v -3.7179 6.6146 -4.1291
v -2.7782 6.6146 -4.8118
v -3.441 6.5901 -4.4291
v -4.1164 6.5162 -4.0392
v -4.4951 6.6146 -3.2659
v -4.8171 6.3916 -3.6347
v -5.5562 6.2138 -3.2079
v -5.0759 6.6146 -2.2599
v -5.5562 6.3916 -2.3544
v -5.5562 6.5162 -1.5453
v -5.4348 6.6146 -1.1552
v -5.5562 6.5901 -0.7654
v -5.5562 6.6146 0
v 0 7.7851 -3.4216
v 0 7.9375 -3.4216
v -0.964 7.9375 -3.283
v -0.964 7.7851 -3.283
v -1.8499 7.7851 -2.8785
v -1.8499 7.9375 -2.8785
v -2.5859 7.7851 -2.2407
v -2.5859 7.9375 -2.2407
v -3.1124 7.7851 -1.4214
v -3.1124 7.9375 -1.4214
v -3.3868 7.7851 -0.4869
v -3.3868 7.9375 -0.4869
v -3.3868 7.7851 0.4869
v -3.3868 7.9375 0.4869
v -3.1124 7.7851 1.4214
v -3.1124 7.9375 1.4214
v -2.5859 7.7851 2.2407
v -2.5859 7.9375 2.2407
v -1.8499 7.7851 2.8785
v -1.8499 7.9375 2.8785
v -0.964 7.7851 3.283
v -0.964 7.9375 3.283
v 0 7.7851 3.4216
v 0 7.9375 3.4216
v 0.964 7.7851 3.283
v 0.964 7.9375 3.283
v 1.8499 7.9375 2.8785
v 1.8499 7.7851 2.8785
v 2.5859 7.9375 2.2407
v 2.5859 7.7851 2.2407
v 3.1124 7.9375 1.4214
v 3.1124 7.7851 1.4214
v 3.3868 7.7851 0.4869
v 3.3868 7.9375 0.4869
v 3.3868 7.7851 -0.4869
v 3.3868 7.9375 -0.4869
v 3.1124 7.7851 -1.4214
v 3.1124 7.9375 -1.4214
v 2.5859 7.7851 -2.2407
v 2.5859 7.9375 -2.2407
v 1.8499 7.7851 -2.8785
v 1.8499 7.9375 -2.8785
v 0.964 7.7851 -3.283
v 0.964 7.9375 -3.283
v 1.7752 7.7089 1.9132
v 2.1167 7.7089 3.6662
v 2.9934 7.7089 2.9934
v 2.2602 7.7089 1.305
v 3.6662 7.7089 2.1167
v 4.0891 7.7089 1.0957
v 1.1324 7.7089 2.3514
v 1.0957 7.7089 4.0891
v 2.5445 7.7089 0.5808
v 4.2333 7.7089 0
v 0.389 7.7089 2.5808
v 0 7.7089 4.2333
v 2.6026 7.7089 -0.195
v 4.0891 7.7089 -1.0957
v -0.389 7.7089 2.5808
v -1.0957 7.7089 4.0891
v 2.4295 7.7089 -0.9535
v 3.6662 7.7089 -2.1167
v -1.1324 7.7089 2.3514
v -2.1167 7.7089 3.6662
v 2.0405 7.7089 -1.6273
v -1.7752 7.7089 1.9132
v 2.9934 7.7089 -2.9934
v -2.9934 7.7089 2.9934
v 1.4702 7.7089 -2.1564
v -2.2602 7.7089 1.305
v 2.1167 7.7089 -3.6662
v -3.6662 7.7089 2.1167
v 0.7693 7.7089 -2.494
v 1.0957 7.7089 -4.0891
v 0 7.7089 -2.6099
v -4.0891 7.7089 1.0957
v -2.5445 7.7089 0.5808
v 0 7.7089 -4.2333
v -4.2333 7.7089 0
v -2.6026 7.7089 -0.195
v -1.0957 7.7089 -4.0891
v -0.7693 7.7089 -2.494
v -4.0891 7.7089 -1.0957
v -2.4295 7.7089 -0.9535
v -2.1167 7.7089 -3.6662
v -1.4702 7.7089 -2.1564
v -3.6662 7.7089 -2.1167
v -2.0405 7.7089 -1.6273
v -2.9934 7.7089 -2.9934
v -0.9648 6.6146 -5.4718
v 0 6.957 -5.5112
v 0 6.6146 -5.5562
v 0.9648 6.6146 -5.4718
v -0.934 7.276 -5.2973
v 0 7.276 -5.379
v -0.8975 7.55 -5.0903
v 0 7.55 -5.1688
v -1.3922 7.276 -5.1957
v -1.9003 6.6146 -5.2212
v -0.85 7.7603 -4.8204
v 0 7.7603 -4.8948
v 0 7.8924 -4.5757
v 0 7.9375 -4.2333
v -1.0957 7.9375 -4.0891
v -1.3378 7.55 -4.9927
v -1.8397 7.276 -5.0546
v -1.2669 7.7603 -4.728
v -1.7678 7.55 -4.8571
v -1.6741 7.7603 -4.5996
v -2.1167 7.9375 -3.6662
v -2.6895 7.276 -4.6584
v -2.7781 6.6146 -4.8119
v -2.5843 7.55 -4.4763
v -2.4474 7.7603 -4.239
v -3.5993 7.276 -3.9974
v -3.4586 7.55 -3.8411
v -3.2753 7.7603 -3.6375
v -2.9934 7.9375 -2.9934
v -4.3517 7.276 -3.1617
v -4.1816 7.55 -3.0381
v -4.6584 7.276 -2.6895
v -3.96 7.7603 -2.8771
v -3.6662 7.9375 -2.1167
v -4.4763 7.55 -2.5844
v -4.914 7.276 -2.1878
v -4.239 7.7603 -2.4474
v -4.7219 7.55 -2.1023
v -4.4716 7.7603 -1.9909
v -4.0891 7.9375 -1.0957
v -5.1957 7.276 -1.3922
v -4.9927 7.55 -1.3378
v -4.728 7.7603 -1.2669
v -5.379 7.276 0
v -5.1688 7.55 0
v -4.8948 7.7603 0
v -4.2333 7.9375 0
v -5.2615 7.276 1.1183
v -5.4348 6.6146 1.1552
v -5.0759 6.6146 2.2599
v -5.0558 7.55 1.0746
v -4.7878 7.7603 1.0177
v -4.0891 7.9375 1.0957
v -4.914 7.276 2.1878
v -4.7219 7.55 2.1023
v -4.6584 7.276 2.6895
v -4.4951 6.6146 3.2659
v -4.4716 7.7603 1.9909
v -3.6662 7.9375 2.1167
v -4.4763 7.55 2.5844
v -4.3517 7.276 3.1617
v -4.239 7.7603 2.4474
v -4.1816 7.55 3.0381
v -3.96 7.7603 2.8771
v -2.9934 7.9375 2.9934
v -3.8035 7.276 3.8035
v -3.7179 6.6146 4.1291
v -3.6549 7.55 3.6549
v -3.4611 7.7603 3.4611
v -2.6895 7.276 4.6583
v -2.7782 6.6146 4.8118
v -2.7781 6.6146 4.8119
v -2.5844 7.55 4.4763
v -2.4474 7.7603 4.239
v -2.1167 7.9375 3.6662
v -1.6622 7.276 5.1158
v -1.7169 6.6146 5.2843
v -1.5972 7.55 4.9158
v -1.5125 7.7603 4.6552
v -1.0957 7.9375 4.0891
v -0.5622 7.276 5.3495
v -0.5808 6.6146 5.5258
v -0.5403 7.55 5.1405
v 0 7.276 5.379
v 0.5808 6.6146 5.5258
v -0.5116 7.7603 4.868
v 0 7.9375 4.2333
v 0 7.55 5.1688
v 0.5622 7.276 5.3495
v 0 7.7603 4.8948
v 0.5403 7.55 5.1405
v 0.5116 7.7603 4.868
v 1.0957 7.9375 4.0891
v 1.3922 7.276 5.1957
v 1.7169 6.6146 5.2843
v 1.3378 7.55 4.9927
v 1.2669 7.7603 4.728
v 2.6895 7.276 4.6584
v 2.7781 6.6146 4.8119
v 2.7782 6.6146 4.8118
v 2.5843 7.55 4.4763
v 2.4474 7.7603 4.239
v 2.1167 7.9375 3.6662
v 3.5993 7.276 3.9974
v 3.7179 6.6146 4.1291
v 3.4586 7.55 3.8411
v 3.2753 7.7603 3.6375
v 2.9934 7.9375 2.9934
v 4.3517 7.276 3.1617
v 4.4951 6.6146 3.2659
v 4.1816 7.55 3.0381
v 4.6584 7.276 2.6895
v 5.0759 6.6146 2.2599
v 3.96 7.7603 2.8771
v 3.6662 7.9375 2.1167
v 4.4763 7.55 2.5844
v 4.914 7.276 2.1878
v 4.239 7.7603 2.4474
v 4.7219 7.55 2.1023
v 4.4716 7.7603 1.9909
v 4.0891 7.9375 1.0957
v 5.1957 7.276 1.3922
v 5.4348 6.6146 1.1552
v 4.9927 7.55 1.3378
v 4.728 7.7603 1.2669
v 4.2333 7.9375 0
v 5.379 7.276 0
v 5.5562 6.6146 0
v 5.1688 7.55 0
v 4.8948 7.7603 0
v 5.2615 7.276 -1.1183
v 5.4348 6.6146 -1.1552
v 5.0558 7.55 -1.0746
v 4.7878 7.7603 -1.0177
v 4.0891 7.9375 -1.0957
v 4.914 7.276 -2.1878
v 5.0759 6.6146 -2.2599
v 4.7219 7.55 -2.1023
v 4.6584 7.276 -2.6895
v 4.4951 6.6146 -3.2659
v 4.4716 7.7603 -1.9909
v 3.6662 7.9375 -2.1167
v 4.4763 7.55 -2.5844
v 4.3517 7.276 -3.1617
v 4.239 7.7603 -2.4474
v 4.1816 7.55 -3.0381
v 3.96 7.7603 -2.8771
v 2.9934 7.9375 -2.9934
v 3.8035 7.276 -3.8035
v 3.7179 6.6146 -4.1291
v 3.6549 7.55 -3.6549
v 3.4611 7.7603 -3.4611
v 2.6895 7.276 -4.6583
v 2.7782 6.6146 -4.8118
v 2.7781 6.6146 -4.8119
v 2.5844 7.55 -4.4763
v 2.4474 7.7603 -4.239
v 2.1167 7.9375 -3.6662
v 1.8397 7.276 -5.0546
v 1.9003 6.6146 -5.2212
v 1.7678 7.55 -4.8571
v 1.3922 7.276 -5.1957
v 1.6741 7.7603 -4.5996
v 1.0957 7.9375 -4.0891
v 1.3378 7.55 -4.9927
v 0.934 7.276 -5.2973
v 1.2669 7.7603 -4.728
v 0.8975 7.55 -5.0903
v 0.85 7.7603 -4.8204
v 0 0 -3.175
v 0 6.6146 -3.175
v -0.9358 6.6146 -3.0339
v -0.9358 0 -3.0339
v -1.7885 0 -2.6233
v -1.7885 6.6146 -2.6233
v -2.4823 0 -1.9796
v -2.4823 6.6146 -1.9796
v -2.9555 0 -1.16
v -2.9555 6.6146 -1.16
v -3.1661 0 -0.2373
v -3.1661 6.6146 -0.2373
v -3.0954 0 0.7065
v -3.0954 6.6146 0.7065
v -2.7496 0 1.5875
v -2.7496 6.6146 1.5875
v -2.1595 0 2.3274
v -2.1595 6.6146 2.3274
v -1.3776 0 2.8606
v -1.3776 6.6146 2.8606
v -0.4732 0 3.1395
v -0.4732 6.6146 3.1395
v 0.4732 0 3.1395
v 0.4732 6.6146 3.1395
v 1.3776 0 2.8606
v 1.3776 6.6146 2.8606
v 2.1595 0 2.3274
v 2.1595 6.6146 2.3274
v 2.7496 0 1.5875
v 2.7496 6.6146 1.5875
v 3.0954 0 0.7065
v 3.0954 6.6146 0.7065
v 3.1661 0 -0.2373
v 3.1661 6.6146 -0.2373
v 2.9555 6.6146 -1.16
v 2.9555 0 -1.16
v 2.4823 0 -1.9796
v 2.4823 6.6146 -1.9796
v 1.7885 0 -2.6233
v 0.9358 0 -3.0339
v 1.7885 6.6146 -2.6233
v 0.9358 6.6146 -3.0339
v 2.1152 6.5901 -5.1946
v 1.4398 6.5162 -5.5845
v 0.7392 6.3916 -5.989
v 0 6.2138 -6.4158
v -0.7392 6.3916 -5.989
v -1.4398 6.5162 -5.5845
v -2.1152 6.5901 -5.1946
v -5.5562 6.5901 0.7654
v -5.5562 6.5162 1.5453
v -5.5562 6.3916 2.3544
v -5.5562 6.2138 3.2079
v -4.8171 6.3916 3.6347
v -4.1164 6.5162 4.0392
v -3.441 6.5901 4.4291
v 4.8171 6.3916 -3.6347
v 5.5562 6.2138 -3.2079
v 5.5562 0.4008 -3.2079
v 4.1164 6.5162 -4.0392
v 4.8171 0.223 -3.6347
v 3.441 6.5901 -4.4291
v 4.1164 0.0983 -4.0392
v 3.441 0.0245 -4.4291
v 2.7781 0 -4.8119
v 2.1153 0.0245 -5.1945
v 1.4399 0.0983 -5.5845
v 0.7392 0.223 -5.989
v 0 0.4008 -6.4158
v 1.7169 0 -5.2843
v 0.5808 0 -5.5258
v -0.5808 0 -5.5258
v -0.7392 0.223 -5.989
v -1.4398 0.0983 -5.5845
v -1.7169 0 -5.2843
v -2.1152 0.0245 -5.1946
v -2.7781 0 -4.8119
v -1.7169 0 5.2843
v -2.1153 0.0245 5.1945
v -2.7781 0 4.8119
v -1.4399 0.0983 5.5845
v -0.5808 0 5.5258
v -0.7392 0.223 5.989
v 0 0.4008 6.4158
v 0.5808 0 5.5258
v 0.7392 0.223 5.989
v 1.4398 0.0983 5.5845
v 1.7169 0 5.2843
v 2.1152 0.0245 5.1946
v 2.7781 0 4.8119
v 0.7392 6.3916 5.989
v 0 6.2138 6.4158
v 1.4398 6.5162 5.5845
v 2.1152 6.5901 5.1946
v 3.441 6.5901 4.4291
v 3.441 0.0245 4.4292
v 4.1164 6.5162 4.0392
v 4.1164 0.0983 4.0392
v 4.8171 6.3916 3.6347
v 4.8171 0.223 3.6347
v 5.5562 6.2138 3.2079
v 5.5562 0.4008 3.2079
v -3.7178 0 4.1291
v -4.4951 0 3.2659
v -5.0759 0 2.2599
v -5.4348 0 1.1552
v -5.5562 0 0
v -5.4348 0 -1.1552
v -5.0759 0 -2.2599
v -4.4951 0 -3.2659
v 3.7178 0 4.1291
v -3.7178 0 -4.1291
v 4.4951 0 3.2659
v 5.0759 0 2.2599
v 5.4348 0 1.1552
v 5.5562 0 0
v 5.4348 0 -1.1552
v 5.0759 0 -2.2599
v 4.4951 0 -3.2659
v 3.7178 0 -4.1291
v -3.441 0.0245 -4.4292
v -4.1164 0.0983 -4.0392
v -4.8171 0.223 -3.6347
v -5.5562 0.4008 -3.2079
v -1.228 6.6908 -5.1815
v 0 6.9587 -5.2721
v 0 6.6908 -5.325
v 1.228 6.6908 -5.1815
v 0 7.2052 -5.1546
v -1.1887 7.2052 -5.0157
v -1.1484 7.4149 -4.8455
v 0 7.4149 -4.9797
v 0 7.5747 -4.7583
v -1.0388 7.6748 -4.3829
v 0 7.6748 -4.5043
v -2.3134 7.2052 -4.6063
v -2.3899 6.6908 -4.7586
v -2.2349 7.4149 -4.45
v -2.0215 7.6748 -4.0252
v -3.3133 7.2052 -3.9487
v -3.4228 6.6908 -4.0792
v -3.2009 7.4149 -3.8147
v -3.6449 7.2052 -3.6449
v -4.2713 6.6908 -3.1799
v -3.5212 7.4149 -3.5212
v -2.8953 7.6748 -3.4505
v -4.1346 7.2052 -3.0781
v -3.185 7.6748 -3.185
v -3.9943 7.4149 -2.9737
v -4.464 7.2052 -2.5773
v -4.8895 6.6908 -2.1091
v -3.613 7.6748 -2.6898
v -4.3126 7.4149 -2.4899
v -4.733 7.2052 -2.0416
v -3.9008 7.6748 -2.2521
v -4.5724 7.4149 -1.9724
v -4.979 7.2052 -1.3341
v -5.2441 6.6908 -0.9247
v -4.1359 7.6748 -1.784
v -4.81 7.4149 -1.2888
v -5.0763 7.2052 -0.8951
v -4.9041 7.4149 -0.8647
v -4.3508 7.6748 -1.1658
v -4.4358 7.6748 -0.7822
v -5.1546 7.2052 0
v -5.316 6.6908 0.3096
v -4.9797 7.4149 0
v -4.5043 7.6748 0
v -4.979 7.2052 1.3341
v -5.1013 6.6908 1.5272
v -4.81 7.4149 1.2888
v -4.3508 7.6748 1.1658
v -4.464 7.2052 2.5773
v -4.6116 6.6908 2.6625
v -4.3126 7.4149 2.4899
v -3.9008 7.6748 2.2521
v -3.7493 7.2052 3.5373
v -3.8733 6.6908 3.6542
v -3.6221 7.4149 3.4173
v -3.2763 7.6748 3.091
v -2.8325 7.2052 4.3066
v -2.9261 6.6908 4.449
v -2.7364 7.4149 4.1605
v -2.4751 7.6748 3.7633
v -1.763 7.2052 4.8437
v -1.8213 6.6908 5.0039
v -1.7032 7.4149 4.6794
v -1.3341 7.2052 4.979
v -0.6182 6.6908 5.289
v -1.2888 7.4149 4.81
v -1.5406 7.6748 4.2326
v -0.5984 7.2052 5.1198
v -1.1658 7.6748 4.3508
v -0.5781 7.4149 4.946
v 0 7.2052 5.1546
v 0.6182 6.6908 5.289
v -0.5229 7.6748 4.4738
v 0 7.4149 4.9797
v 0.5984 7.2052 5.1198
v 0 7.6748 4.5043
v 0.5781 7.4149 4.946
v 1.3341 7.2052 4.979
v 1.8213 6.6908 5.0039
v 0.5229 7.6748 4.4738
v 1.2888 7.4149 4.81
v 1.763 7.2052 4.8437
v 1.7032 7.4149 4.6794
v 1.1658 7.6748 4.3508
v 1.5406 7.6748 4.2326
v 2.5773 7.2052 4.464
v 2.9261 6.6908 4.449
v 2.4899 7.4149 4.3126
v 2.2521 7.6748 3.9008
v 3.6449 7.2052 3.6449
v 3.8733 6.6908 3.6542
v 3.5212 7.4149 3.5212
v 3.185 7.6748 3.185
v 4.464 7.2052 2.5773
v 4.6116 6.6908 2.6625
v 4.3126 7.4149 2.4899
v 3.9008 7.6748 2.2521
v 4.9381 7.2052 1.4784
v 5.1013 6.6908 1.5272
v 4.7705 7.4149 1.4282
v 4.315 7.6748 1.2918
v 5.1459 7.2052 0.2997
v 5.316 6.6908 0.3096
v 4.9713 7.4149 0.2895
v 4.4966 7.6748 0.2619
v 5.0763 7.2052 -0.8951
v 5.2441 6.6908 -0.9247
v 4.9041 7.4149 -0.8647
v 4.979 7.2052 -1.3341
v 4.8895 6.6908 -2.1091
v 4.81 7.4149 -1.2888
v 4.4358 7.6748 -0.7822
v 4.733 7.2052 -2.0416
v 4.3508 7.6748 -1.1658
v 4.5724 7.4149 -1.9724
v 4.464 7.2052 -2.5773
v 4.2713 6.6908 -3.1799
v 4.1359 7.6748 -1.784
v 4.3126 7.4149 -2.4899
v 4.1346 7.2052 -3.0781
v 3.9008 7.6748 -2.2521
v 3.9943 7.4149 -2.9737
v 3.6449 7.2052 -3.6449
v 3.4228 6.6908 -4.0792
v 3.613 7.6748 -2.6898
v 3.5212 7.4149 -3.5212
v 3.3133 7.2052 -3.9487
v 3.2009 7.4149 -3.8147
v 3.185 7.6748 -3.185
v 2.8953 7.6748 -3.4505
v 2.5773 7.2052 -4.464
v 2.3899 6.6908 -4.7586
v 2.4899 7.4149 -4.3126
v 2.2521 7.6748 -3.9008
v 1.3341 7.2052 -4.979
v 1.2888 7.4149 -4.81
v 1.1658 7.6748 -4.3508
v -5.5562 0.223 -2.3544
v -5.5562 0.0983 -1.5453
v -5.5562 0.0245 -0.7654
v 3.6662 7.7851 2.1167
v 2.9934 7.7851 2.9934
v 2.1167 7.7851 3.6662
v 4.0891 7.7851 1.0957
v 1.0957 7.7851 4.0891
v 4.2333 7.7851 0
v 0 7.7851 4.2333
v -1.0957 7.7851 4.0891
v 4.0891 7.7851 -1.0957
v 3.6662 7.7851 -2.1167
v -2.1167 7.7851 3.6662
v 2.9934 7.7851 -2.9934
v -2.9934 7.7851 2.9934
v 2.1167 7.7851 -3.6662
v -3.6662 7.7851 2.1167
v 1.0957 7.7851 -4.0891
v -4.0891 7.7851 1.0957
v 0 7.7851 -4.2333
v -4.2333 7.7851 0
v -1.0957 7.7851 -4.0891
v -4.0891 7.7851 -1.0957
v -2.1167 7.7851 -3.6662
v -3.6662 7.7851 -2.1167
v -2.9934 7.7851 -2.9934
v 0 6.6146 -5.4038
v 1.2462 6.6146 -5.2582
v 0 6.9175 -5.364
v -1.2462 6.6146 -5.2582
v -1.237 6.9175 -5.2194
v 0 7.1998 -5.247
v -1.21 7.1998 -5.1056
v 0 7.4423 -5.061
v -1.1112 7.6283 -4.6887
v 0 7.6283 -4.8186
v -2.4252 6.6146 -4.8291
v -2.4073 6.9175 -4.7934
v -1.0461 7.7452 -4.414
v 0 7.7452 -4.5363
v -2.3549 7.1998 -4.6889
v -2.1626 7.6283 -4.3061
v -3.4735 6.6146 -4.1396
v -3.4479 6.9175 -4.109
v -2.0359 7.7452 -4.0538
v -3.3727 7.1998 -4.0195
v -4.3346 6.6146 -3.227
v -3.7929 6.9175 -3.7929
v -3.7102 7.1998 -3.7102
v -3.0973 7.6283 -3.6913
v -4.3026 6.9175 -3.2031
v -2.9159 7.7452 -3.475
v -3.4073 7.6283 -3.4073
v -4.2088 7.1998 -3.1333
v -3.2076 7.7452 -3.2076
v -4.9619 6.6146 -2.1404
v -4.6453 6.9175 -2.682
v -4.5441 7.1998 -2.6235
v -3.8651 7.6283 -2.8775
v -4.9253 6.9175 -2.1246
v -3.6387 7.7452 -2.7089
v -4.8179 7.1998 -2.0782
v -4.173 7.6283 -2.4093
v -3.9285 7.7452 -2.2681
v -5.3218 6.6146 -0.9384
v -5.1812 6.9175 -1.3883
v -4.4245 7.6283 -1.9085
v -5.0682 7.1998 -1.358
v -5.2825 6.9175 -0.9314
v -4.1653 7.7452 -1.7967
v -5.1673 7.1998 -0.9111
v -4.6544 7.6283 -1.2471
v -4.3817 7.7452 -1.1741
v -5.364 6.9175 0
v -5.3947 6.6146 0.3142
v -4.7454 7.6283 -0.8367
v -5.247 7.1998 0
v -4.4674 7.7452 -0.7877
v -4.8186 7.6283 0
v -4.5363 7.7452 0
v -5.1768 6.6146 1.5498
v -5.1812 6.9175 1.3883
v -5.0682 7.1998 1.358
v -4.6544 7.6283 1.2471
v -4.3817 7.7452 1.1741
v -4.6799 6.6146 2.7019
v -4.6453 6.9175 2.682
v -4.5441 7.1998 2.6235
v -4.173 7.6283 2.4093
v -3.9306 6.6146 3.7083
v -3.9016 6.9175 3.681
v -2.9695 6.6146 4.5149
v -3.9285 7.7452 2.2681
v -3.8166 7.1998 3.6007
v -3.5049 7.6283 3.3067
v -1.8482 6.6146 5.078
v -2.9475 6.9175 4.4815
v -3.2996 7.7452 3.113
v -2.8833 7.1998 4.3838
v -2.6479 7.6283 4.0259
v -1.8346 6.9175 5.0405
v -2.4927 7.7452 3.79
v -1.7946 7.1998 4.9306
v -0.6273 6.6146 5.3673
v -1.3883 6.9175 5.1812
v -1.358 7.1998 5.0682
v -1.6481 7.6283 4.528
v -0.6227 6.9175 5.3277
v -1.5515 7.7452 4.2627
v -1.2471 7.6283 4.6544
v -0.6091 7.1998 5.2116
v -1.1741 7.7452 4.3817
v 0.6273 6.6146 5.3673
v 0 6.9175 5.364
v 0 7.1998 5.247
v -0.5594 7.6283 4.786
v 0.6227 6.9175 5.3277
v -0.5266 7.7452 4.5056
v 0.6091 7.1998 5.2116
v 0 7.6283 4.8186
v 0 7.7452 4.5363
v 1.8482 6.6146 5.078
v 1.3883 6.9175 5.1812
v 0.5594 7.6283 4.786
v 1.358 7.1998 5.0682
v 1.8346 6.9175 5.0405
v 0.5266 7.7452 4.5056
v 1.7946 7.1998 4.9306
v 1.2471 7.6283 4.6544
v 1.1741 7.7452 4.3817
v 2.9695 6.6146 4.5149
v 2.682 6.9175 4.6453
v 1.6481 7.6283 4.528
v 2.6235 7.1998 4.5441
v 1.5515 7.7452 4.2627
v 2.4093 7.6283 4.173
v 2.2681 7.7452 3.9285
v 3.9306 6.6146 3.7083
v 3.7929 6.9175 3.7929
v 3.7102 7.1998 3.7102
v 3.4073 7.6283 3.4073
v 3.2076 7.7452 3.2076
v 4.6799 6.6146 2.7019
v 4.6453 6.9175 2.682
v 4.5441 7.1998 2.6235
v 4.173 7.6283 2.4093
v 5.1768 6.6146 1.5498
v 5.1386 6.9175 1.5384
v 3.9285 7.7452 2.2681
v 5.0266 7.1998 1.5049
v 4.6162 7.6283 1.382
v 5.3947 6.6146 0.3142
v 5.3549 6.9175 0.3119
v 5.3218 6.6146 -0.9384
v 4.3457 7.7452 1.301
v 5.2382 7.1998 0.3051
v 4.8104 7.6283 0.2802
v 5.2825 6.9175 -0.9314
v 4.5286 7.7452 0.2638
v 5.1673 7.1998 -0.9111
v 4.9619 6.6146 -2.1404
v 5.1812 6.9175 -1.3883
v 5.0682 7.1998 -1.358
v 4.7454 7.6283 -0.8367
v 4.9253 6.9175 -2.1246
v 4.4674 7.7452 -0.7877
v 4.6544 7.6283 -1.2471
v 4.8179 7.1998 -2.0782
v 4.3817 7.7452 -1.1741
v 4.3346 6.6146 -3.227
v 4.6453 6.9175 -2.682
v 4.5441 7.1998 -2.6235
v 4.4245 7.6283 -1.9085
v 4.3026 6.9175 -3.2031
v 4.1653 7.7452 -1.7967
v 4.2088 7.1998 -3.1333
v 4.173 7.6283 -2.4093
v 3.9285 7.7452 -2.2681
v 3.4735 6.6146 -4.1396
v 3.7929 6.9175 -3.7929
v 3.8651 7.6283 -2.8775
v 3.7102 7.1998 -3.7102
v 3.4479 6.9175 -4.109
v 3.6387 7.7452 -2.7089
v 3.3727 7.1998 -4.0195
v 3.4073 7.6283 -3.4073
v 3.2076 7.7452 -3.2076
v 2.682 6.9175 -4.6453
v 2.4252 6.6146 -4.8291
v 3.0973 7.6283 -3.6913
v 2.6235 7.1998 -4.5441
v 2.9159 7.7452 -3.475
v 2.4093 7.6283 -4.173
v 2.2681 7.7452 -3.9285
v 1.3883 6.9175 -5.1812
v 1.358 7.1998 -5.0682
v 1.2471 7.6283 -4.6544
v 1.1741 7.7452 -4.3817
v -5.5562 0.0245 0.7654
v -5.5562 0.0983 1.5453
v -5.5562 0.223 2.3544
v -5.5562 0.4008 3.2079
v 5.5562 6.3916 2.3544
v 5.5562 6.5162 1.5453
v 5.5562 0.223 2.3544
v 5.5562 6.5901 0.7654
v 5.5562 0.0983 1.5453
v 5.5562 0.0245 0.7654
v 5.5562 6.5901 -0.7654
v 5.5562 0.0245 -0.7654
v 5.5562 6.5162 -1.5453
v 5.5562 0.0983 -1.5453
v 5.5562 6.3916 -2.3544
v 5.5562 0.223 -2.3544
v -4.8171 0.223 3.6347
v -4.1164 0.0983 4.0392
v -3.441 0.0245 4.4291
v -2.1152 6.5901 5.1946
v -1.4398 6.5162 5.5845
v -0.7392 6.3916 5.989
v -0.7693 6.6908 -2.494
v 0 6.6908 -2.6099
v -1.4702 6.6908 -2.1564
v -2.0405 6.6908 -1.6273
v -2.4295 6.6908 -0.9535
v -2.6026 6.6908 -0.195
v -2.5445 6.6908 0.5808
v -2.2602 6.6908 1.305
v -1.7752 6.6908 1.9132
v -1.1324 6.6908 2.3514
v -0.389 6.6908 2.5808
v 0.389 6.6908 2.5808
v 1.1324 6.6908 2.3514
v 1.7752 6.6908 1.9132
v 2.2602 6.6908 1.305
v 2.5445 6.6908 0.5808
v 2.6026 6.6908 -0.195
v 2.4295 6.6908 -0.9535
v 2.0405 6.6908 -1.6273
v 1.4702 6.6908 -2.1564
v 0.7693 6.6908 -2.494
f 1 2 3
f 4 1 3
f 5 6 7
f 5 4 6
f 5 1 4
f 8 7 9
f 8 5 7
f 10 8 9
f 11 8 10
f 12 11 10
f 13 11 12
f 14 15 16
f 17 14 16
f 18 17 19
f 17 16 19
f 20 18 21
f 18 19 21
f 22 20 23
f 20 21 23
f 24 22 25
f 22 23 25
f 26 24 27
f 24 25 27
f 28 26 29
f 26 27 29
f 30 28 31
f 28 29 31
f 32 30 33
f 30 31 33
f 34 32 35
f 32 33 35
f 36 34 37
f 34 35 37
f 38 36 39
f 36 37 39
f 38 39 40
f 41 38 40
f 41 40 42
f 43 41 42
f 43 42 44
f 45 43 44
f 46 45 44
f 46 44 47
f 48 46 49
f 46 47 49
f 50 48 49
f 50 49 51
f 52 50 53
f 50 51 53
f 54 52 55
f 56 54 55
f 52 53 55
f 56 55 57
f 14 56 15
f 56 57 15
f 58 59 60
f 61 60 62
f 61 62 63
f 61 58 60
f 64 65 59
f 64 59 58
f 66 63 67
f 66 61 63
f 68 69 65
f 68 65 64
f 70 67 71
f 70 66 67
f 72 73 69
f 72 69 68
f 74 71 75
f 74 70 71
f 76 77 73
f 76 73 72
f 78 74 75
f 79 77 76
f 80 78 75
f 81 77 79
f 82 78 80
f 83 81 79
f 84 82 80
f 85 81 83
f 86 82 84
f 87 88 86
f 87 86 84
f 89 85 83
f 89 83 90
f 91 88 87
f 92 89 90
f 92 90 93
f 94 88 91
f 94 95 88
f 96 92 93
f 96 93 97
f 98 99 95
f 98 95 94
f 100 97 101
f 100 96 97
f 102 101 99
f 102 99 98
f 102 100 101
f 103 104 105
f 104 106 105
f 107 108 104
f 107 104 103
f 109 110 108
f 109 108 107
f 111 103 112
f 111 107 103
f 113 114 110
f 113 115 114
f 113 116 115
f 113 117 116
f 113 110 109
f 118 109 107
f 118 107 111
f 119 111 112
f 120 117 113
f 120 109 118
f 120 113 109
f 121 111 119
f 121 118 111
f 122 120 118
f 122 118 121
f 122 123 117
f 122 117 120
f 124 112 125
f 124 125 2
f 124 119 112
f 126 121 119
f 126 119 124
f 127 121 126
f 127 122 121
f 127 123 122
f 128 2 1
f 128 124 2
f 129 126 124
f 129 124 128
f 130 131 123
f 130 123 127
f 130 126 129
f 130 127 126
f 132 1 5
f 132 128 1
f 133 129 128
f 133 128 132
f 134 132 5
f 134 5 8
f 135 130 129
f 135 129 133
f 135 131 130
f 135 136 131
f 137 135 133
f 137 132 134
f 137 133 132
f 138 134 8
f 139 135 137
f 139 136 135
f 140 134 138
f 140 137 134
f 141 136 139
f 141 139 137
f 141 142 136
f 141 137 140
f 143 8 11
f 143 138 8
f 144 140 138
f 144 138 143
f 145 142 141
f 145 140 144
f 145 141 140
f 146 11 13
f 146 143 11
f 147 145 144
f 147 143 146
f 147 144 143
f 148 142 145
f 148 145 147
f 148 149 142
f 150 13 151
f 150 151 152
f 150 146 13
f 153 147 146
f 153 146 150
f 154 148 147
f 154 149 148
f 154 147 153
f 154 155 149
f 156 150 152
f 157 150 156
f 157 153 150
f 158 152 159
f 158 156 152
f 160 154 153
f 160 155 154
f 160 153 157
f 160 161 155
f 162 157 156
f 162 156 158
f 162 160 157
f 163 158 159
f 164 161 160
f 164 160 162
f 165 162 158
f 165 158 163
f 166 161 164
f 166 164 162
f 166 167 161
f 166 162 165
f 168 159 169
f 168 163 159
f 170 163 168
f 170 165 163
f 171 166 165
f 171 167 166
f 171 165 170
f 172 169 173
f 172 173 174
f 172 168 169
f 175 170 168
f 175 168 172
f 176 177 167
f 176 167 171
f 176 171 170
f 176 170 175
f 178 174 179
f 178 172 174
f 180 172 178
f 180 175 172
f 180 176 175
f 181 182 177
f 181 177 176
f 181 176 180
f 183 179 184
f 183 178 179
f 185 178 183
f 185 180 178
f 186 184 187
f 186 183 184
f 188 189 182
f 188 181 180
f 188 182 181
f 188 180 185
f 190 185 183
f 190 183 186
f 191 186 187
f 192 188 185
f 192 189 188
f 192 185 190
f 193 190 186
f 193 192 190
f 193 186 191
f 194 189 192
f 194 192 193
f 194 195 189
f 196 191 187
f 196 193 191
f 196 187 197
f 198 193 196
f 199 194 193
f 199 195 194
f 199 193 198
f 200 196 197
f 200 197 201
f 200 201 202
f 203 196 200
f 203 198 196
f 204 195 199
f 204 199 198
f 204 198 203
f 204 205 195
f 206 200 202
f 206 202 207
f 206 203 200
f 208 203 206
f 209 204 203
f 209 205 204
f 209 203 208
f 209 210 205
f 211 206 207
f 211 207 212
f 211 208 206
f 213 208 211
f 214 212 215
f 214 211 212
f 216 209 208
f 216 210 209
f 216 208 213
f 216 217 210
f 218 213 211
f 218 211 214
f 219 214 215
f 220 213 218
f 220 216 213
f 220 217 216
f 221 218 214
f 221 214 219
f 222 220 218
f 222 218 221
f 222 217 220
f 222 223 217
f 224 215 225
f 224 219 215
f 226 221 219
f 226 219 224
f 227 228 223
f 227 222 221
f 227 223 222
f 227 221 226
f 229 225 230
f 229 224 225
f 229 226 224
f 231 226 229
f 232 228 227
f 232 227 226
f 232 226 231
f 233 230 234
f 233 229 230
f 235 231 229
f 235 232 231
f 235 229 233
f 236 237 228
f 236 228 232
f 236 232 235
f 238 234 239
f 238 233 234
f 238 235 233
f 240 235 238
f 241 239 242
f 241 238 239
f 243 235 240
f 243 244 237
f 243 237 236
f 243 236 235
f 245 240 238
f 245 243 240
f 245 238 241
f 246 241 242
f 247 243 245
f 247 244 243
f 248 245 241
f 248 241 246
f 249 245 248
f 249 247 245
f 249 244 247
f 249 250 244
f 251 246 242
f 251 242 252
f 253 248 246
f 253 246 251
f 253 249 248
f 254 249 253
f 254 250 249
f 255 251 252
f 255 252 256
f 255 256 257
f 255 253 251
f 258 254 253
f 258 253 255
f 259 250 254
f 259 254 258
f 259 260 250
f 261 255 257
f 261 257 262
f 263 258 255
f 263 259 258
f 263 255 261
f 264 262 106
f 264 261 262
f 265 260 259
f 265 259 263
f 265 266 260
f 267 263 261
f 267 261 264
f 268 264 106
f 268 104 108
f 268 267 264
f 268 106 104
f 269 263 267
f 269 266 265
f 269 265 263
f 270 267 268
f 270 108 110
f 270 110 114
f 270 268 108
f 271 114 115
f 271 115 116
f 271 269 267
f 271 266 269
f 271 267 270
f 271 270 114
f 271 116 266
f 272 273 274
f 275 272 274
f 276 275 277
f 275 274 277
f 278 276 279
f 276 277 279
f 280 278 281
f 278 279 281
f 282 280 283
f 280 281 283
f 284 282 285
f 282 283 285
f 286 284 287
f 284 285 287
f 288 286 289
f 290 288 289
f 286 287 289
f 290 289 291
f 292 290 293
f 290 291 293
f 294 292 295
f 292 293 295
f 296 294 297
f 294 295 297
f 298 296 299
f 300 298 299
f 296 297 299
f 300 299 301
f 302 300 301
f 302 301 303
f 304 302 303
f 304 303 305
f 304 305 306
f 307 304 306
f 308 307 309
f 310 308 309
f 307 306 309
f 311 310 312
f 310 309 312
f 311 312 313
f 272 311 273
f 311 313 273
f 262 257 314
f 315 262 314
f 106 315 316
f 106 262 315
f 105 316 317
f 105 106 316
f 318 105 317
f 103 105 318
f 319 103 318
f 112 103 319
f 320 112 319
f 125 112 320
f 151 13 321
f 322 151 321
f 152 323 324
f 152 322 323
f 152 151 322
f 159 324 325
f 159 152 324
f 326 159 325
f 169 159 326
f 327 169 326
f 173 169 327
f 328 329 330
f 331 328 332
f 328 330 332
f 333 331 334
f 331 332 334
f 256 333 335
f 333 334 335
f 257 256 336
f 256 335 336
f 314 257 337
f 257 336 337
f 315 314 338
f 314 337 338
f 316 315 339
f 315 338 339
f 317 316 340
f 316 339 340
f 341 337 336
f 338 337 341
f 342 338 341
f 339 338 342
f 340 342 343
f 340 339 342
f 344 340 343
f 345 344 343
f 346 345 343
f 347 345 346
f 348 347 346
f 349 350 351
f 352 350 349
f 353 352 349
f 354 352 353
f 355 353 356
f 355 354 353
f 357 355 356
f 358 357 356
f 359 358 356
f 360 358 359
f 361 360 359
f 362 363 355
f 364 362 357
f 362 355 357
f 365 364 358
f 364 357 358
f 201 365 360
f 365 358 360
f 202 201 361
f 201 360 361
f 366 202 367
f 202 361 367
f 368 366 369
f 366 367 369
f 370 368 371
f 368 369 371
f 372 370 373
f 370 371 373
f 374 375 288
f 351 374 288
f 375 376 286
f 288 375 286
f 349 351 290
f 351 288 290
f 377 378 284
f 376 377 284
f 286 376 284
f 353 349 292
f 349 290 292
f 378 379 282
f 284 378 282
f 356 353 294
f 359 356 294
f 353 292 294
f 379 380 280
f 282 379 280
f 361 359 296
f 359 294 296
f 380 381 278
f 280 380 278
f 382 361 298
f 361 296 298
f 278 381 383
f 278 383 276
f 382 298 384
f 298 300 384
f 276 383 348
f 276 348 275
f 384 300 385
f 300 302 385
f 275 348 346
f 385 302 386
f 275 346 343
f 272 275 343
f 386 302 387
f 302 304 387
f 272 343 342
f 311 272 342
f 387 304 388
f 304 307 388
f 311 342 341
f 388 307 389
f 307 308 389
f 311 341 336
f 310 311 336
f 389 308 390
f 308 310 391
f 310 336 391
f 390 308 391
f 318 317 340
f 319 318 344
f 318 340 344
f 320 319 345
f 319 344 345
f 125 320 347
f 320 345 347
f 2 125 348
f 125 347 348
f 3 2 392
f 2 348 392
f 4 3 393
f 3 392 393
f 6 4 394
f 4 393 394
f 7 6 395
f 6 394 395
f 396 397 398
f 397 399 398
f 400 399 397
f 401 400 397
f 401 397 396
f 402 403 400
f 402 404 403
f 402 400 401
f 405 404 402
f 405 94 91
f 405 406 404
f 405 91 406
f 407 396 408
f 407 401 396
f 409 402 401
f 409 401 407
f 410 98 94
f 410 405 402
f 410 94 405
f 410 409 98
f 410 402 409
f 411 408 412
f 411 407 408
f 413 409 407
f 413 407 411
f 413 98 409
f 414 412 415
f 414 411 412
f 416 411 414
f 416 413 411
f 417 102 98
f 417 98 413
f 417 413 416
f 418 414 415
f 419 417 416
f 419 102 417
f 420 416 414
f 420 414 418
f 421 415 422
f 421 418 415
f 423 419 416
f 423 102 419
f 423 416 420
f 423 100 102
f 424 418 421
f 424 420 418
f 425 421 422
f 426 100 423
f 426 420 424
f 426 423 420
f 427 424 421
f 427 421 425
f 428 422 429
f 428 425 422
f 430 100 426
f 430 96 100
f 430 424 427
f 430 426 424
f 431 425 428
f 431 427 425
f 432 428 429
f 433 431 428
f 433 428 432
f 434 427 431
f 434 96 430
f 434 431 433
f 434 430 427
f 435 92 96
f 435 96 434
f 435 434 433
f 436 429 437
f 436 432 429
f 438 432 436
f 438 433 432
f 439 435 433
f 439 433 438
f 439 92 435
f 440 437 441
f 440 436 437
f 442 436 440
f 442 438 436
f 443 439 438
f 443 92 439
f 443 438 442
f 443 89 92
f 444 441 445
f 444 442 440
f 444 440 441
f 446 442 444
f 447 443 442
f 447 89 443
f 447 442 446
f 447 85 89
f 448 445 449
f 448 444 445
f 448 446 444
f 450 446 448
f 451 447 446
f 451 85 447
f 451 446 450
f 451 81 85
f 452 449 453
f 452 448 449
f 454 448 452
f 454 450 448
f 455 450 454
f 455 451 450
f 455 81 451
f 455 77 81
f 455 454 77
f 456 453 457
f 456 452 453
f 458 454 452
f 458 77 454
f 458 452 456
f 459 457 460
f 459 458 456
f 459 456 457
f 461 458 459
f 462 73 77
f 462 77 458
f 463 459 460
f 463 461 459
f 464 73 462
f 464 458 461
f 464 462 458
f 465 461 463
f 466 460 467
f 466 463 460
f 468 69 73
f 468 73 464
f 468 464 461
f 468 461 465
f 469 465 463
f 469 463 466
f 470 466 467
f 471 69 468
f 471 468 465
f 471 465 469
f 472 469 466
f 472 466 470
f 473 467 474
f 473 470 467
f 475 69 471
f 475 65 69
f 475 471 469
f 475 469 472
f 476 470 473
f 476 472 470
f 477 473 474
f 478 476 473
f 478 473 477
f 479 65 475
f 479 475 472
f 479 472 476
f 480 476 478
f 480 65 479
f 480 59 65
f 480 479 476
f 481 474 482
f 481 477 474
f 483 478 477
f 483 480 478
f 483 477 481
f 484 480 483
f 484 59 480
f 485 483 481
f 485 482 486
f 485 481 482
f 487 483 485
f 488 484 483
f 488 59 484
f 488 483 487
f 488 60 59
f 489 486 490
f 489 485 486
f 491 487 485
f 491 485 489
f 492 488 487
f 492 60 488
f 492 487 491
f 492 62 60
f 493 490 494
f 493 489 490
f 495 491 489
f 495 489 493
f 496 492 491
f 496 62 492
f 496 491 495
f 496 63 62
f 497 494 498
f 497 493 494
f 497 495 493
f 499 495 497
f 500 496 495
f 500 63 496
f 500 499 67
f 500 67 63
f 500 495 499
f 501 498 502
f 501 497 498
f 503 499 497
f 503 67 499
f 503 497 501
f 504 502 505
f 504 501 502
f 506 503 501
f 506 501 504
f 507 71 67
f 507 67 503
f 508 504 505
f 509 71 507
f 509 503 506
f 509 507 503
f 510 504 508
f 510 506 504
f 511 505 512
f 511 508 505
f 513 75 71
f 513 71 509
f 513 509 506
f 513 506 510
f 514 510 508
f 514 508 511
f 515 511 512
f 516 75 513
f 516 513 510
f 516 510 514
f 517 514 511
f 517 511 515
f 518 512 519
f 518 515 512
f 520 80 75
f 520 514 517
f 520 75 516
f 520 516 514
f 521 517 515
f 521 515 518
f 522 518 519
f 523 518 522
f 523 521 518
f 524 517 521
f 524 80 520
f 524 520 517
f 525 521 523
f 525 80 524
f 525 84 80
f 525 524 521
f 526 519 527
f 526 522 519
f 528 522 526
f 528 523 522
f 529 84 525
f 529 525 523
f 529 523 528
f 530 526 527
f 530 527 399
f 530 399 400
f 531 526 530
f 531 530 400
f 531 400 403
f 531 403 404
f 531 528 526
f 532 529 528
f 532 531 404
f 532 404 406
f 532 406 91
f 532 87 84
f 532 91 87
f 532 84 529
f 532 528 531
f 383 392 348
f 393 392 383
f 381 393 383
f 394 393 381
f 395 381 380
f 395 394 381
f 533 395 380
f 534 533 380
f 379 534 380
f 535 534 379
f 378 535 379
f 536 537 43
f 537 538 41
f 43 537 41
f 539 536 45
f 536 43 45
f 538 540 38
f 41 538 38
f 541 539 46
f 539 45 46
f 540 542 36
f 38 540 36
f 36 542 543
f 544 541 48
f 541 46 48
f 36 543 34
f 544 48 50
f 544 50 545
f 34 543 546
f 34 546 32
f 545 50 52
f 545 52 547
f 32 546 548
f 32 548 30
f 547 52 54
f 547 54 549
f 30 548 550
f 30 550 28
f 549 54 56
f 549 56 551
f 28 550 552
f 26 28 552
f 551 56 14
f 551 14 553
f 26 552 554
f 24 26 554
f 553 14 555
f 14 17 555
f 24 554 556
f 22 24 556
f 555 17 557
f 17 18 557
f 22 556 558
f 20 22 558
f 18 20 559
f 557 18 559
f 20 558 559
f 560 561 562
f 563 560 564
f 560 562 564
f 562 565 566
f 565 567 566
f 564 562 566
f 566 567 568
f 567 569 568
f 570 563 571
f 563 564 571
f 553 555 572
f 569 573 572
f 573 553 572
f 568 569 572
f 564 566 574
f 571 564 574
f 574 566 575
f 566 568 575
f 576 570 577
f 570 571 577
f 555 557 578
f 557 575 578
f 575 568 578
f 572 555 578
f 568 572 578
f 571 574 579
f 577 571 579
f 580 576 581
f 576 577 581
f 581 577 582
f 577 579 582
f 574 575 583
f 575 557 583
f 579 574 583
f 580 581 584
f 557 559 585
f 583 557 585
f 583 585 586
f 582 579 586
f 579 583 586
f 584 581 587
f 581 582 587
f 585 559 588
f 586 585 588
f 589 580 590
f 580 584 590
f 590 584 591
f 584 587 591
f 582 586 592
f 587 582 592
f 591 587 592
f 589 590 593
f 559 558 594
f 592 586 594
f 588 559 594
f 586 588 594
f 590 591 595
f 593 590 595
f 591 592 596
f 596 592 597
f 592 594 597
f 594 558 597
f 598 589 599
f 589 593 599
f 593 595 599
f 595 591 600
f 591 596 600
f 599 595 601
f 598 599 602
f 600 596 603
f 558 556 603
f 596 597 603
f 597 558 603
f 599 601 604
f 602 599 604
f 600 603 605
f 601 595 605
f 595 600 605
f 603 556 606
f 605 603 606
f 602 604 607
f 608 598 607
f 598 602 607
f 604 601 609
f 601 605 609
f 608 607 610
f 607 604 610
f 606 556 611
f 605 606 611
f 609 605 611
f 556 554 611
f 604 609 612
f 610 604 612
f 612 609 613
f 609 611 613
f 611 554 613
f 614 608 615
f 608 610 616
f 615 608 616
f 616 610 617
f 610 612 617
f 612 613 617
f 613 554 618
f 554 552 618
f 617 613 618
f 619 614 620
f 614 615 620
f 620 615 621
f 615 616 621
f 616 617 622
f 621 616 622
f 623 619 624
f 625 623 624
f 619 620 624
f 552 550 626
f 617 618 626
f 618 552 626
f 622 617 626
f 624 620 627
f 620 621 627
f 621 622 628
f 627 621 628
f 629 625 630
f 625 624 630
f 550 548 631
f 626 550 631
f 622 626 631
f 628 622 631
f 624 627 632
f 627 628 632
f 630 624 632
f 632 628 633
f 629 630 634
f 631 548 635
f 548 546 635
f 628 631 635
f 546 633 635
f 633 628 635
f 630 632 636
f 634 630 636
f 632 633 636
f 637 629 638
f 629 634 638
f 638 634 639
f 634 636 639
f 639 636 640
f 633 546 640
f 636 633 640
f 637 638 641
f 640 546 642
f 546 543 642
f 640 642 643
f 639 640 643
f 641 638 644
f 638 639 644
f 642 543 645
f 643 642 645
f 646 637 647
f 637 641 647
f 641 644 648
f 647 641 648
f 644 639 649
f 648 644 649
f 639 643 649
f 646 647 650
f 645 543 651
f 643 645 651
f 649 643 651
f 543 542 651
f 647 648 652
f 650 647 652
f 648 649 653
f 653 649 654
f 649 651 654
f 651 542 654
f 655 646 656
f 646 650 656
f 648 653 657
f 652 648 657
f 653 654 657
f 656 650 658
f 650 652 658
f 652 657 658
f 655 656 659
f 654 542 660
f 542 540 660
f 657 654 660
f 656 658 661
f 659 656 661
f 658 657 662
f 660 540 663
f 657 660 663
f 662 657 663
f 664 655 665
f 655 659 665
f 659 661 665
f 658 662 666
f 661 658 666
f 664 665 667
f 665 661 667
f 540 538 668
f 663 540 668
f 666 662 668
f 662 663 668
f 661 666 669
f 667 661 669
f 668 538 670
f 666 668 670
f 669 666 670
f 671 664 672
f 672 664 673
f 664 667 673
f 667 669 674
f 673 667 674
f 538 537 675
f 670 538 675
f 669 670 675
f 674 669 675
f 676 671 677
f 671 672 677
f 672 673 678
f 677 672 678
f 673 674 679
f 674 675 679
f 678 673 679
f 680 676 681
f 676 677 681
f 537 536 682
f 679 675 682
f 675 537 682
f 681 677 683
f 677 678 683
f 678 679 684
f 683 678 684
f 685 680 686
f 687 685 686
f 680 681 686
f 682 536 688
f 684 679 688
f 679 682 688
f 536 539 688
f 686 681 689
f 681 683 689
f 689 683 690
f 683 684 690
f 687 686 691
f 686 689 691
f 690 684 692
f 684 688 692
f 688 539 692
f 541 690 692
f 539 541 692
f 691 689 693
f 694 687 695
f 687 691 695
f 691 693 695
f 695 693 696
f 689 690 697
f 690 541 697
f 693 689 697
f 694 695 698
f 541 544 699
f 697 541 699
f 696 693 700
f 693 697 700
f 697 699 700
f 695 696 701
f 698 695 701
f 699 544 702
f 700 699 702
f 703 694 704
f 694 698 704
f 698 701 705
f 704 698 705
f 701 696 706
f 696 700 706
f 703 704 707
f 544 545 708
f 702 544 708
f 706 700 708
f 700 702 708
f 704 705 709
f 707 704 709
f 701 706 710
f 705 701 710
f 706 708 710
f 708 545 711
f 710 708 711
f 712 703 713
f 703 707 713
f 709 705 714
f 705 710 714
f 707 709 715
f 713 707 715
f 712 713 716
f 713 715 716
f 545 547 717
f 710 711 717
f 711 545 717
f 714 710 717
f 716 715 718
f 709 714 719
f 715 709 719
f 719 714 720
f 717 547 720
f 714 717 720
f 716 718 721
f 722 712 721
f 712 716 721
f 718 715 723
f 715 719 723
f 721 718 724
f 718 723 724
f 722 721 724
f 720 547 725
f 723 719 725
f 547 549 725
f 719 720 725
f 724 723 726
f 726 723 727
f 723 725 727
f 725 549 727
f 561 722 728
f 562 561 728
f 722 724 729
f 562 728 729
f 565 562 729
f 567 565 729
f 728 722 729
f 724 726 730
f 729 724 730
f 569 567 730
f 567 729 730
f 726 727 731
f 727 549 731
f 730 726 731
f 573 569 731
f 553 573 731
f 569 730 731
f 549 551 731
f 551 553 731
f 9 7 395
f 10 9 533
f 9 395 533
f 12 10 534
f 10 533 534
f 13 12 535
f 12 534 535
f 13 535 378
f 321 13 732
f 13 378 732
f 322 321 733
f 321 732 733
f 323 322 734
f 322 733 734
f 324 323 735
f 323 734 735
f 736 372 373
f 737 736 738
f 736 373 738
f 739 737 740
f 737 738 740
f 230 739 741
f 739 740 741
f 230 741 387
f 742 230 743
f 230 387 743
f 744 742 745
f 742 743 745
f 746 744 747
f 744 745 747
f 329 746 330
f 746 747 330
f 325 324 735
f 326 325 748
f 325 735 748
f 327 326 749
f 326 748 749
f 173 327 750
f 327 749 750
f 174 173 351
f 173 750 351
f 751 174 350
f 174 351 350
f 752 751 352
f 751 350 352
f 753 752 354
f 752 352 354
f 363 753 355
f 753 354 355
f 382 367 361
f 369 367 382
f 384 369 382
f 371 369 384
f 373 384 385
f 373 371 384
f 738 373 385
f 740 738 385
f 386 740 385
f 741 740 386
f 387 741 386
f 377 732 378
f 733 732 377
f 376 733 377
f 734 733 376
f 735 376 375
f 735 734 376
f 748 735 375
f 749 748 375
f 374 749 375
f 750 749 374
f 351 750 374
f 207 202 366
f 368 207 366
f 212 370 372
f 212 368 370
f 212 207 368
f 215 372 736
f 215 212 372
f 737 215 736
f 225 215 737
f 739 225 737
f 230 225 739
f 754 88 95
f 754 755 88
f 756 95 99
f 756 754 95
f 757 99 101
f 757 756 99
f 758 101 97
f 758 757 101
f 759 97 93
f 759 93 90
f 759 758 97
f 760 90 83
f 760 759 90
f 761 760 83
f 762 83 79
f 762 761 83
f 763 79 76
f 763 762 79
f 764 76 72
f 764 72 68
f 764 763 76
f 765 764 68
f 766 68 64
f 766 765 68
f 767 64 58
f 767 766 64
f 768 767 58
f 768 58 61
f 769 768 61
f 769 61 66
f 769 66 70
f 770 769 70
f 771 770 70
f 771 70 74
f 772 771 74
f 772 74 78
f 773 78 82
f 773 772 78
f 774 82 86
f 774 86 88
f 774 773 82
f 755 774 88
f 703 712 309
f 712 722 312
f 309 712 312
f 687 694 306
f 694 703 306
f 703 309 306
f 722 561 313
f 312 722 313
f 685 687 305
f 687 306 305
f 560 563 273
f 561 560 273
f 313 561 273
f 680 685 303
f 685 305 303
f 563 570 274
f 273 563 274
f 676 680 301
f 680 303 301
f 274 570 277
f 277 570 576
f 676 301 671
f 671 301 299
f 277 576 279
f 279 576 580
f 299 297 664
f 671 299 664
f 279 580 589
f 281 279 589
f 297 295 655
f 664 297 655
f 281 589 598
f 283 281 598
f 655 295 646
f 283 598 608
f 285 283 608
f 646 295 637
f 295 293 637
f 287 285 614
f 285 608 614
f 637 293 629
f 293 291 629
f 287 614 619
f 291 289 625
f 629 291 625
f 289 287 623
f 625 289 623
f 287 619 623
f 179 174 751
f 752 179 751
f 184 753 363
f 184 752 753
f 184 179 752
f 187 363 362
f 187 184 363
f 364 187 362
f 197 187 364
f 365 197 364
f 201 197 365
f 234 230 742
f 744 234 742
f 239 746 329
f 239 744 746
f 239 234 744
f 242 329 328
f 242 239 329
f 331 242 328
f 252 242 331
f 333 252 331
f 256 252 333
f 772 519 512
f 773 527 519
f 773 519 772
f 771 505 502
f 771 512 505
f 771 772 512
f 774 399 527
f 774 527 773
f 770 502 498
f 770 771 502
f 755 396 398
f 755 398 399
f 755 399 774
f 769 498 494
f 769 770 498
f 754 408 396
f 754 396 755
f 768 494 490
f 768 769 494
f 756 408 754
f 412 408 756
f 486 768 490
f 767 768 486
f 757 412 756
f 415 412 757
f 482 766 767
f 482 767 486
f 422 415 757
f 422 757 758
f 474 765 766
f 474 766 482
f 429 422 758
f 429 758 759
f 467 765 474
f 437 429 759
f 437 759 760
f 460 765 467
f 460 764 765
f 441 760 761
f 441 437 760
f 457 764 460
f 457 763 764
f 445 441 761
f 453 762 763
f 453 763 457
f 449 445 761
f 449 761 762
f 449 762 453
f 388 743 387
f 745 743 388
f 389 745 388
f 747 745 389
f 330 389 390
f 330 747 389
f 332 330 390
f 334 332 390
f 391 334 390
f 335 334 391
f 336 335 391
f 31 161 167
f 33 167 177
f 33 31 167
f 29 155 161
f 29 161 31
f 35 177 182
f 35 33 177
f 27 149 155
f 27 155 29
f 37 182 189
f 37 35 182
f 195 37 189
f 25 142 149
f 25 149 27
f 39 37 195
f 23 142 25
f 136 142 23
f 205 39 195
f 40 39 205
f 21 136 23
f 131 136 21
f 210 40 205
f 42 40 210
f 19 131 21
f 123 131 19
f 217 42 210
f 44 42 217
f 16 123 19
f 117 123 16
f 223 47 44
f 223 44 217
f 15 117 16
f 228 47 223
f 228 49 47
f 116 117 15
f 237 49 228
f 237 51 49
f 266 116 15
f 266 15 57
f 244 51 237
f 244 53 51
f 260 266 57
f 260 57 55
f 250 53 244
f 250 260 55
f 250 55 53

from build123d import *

# Parameters (mm, degrees)
EXTRUDE1_DEPTH = 7.9375
SKETCH2_W      = 3.175
SKETCH2_H      = 7.9375


with BuildPart() as part:
    # Sketch1 → Extrude1 (new body)
    with BuildSketch(Plane(origin=(0, 0, 0), x_dir=(1, 0, 0), z_dir=(0, 1, 0))):
        Polygon((0, 6.415804866), (-5.55625, 3.207902433), (-5.55625, -3.207902433), (0, -6.415804866), (5.55625, -3.207902433), (5.55625, 3.207902433), align=None)
    extrude(amount=EXTRUDE1_DEPTH)


with BuildPart() as body_2:
    # Sketch2 → Revolve1 (revolve)
    with BuildSketch(Plane(origin=(0, 0, 0), x_dir=(0, 0, -1), z_dir=(1, 0, 0))):
        with Locations((1.5875, 3.96875)):
            Rectangle(SKETCH2_W, SKETCH2_H)
    revolve(axis=Axis((0, -3.175, 0), (0, 1, 0)))


with BuildPart() as part_1:
    add(part.part)

    # Combine1: cut body 2
    add(body_2.part, mode=Mode.SUBTRACT)

    # Sketch5 → Cut-Revolve3 (revolve, cut)
    with BuildSketch(Plane(origin=(0, 0, 0), x_dir=(0, 0, -1), z_dir=(1, 0, 0))):
        with BuildLine():
            Line((0, 0), (5.55625, 0))
            Line((5.55625, 0), (6.415804866, 0.400817017))
            Line((6.415804866, 0.400817017), (6.415804866, 6.213766317))
            Line((6.415804866, 6.213766317), (5.55625, 6.614583333))
            ThreePointArc((5.55625, 6.614583333), (5.168776679, 7.550026679), (4.233333333, 7.9375))
            Line((4.233333333, 7.9375), (4.233333333, 9.2075))
            Line((4.233333333, 9.2075), (7.685804866, 9.2075))
            Line((7.685804866, 9.2075), (7.685804866, -1.27))
            Line((7.685804866, -1.27), (0, -1.27))
            Line((0, -1.27), (0, 0))
        make_face()
    revolve(axis=Axis((0, 0, 0), (0, 1, 0)), mode=Mode.SUBTRACT)

    # Sketch6 → Cut-Revolve4 (revolve, cut)
    with BuildSketch(Plane(origin=(0, 0, 0), x_dir=(0, 0, -1), z_dir=(1, 0, 0))):
        with BuildLine():
            Line((0, 6.614583333), (5.40385, 6.614583333))
            ThreePointArc((5.40385, 6.614583333), (5.061013606, 7.442263606), (4.233333333, 7.7851))
            Line((4.233333333, 7.7851), (3.421620845, 7.7851))
            Line((3.421620845, 7.7851), (3.421620845, 9.2075))
            Line((3.421620845, 9.2075), (0, 9.2075))
            Line((0, 9.2075), (0, 6.614583333))
        make_face()
    revolve(axis=Axis((0, 9.2075, 0), (0, 1, 0)), mode=Mode.SUBTRACT)


with BuildPart() as body_2_2:
    # Sketch7 → Revolve2 (revolve)
    with BuildSketch(Plane(origin=(0, 0, 0), x_dir=(0, 0, -1), z_dir=(1, 0, 0))):
        with BuildLine():
            Line((2.609908356, 6.690783333), (5.324993778, 6.690783333))
            ThreePointArc((5.324993778, 6.690783333), (4.979705237, 7.4148695), (4.233333333, 7.7089))
            Line((4.233333333, 7.7089), (2.609908356, 7.7089))
            Line((2.609908356, 7.7089), (2.609908356, 6.690783333))
        make_face()
    revolve(axis=Axis((0, 6.690783333, 0), (0, 1, 0)))


solid = Compound([part_1.part, body_2_2.part])
